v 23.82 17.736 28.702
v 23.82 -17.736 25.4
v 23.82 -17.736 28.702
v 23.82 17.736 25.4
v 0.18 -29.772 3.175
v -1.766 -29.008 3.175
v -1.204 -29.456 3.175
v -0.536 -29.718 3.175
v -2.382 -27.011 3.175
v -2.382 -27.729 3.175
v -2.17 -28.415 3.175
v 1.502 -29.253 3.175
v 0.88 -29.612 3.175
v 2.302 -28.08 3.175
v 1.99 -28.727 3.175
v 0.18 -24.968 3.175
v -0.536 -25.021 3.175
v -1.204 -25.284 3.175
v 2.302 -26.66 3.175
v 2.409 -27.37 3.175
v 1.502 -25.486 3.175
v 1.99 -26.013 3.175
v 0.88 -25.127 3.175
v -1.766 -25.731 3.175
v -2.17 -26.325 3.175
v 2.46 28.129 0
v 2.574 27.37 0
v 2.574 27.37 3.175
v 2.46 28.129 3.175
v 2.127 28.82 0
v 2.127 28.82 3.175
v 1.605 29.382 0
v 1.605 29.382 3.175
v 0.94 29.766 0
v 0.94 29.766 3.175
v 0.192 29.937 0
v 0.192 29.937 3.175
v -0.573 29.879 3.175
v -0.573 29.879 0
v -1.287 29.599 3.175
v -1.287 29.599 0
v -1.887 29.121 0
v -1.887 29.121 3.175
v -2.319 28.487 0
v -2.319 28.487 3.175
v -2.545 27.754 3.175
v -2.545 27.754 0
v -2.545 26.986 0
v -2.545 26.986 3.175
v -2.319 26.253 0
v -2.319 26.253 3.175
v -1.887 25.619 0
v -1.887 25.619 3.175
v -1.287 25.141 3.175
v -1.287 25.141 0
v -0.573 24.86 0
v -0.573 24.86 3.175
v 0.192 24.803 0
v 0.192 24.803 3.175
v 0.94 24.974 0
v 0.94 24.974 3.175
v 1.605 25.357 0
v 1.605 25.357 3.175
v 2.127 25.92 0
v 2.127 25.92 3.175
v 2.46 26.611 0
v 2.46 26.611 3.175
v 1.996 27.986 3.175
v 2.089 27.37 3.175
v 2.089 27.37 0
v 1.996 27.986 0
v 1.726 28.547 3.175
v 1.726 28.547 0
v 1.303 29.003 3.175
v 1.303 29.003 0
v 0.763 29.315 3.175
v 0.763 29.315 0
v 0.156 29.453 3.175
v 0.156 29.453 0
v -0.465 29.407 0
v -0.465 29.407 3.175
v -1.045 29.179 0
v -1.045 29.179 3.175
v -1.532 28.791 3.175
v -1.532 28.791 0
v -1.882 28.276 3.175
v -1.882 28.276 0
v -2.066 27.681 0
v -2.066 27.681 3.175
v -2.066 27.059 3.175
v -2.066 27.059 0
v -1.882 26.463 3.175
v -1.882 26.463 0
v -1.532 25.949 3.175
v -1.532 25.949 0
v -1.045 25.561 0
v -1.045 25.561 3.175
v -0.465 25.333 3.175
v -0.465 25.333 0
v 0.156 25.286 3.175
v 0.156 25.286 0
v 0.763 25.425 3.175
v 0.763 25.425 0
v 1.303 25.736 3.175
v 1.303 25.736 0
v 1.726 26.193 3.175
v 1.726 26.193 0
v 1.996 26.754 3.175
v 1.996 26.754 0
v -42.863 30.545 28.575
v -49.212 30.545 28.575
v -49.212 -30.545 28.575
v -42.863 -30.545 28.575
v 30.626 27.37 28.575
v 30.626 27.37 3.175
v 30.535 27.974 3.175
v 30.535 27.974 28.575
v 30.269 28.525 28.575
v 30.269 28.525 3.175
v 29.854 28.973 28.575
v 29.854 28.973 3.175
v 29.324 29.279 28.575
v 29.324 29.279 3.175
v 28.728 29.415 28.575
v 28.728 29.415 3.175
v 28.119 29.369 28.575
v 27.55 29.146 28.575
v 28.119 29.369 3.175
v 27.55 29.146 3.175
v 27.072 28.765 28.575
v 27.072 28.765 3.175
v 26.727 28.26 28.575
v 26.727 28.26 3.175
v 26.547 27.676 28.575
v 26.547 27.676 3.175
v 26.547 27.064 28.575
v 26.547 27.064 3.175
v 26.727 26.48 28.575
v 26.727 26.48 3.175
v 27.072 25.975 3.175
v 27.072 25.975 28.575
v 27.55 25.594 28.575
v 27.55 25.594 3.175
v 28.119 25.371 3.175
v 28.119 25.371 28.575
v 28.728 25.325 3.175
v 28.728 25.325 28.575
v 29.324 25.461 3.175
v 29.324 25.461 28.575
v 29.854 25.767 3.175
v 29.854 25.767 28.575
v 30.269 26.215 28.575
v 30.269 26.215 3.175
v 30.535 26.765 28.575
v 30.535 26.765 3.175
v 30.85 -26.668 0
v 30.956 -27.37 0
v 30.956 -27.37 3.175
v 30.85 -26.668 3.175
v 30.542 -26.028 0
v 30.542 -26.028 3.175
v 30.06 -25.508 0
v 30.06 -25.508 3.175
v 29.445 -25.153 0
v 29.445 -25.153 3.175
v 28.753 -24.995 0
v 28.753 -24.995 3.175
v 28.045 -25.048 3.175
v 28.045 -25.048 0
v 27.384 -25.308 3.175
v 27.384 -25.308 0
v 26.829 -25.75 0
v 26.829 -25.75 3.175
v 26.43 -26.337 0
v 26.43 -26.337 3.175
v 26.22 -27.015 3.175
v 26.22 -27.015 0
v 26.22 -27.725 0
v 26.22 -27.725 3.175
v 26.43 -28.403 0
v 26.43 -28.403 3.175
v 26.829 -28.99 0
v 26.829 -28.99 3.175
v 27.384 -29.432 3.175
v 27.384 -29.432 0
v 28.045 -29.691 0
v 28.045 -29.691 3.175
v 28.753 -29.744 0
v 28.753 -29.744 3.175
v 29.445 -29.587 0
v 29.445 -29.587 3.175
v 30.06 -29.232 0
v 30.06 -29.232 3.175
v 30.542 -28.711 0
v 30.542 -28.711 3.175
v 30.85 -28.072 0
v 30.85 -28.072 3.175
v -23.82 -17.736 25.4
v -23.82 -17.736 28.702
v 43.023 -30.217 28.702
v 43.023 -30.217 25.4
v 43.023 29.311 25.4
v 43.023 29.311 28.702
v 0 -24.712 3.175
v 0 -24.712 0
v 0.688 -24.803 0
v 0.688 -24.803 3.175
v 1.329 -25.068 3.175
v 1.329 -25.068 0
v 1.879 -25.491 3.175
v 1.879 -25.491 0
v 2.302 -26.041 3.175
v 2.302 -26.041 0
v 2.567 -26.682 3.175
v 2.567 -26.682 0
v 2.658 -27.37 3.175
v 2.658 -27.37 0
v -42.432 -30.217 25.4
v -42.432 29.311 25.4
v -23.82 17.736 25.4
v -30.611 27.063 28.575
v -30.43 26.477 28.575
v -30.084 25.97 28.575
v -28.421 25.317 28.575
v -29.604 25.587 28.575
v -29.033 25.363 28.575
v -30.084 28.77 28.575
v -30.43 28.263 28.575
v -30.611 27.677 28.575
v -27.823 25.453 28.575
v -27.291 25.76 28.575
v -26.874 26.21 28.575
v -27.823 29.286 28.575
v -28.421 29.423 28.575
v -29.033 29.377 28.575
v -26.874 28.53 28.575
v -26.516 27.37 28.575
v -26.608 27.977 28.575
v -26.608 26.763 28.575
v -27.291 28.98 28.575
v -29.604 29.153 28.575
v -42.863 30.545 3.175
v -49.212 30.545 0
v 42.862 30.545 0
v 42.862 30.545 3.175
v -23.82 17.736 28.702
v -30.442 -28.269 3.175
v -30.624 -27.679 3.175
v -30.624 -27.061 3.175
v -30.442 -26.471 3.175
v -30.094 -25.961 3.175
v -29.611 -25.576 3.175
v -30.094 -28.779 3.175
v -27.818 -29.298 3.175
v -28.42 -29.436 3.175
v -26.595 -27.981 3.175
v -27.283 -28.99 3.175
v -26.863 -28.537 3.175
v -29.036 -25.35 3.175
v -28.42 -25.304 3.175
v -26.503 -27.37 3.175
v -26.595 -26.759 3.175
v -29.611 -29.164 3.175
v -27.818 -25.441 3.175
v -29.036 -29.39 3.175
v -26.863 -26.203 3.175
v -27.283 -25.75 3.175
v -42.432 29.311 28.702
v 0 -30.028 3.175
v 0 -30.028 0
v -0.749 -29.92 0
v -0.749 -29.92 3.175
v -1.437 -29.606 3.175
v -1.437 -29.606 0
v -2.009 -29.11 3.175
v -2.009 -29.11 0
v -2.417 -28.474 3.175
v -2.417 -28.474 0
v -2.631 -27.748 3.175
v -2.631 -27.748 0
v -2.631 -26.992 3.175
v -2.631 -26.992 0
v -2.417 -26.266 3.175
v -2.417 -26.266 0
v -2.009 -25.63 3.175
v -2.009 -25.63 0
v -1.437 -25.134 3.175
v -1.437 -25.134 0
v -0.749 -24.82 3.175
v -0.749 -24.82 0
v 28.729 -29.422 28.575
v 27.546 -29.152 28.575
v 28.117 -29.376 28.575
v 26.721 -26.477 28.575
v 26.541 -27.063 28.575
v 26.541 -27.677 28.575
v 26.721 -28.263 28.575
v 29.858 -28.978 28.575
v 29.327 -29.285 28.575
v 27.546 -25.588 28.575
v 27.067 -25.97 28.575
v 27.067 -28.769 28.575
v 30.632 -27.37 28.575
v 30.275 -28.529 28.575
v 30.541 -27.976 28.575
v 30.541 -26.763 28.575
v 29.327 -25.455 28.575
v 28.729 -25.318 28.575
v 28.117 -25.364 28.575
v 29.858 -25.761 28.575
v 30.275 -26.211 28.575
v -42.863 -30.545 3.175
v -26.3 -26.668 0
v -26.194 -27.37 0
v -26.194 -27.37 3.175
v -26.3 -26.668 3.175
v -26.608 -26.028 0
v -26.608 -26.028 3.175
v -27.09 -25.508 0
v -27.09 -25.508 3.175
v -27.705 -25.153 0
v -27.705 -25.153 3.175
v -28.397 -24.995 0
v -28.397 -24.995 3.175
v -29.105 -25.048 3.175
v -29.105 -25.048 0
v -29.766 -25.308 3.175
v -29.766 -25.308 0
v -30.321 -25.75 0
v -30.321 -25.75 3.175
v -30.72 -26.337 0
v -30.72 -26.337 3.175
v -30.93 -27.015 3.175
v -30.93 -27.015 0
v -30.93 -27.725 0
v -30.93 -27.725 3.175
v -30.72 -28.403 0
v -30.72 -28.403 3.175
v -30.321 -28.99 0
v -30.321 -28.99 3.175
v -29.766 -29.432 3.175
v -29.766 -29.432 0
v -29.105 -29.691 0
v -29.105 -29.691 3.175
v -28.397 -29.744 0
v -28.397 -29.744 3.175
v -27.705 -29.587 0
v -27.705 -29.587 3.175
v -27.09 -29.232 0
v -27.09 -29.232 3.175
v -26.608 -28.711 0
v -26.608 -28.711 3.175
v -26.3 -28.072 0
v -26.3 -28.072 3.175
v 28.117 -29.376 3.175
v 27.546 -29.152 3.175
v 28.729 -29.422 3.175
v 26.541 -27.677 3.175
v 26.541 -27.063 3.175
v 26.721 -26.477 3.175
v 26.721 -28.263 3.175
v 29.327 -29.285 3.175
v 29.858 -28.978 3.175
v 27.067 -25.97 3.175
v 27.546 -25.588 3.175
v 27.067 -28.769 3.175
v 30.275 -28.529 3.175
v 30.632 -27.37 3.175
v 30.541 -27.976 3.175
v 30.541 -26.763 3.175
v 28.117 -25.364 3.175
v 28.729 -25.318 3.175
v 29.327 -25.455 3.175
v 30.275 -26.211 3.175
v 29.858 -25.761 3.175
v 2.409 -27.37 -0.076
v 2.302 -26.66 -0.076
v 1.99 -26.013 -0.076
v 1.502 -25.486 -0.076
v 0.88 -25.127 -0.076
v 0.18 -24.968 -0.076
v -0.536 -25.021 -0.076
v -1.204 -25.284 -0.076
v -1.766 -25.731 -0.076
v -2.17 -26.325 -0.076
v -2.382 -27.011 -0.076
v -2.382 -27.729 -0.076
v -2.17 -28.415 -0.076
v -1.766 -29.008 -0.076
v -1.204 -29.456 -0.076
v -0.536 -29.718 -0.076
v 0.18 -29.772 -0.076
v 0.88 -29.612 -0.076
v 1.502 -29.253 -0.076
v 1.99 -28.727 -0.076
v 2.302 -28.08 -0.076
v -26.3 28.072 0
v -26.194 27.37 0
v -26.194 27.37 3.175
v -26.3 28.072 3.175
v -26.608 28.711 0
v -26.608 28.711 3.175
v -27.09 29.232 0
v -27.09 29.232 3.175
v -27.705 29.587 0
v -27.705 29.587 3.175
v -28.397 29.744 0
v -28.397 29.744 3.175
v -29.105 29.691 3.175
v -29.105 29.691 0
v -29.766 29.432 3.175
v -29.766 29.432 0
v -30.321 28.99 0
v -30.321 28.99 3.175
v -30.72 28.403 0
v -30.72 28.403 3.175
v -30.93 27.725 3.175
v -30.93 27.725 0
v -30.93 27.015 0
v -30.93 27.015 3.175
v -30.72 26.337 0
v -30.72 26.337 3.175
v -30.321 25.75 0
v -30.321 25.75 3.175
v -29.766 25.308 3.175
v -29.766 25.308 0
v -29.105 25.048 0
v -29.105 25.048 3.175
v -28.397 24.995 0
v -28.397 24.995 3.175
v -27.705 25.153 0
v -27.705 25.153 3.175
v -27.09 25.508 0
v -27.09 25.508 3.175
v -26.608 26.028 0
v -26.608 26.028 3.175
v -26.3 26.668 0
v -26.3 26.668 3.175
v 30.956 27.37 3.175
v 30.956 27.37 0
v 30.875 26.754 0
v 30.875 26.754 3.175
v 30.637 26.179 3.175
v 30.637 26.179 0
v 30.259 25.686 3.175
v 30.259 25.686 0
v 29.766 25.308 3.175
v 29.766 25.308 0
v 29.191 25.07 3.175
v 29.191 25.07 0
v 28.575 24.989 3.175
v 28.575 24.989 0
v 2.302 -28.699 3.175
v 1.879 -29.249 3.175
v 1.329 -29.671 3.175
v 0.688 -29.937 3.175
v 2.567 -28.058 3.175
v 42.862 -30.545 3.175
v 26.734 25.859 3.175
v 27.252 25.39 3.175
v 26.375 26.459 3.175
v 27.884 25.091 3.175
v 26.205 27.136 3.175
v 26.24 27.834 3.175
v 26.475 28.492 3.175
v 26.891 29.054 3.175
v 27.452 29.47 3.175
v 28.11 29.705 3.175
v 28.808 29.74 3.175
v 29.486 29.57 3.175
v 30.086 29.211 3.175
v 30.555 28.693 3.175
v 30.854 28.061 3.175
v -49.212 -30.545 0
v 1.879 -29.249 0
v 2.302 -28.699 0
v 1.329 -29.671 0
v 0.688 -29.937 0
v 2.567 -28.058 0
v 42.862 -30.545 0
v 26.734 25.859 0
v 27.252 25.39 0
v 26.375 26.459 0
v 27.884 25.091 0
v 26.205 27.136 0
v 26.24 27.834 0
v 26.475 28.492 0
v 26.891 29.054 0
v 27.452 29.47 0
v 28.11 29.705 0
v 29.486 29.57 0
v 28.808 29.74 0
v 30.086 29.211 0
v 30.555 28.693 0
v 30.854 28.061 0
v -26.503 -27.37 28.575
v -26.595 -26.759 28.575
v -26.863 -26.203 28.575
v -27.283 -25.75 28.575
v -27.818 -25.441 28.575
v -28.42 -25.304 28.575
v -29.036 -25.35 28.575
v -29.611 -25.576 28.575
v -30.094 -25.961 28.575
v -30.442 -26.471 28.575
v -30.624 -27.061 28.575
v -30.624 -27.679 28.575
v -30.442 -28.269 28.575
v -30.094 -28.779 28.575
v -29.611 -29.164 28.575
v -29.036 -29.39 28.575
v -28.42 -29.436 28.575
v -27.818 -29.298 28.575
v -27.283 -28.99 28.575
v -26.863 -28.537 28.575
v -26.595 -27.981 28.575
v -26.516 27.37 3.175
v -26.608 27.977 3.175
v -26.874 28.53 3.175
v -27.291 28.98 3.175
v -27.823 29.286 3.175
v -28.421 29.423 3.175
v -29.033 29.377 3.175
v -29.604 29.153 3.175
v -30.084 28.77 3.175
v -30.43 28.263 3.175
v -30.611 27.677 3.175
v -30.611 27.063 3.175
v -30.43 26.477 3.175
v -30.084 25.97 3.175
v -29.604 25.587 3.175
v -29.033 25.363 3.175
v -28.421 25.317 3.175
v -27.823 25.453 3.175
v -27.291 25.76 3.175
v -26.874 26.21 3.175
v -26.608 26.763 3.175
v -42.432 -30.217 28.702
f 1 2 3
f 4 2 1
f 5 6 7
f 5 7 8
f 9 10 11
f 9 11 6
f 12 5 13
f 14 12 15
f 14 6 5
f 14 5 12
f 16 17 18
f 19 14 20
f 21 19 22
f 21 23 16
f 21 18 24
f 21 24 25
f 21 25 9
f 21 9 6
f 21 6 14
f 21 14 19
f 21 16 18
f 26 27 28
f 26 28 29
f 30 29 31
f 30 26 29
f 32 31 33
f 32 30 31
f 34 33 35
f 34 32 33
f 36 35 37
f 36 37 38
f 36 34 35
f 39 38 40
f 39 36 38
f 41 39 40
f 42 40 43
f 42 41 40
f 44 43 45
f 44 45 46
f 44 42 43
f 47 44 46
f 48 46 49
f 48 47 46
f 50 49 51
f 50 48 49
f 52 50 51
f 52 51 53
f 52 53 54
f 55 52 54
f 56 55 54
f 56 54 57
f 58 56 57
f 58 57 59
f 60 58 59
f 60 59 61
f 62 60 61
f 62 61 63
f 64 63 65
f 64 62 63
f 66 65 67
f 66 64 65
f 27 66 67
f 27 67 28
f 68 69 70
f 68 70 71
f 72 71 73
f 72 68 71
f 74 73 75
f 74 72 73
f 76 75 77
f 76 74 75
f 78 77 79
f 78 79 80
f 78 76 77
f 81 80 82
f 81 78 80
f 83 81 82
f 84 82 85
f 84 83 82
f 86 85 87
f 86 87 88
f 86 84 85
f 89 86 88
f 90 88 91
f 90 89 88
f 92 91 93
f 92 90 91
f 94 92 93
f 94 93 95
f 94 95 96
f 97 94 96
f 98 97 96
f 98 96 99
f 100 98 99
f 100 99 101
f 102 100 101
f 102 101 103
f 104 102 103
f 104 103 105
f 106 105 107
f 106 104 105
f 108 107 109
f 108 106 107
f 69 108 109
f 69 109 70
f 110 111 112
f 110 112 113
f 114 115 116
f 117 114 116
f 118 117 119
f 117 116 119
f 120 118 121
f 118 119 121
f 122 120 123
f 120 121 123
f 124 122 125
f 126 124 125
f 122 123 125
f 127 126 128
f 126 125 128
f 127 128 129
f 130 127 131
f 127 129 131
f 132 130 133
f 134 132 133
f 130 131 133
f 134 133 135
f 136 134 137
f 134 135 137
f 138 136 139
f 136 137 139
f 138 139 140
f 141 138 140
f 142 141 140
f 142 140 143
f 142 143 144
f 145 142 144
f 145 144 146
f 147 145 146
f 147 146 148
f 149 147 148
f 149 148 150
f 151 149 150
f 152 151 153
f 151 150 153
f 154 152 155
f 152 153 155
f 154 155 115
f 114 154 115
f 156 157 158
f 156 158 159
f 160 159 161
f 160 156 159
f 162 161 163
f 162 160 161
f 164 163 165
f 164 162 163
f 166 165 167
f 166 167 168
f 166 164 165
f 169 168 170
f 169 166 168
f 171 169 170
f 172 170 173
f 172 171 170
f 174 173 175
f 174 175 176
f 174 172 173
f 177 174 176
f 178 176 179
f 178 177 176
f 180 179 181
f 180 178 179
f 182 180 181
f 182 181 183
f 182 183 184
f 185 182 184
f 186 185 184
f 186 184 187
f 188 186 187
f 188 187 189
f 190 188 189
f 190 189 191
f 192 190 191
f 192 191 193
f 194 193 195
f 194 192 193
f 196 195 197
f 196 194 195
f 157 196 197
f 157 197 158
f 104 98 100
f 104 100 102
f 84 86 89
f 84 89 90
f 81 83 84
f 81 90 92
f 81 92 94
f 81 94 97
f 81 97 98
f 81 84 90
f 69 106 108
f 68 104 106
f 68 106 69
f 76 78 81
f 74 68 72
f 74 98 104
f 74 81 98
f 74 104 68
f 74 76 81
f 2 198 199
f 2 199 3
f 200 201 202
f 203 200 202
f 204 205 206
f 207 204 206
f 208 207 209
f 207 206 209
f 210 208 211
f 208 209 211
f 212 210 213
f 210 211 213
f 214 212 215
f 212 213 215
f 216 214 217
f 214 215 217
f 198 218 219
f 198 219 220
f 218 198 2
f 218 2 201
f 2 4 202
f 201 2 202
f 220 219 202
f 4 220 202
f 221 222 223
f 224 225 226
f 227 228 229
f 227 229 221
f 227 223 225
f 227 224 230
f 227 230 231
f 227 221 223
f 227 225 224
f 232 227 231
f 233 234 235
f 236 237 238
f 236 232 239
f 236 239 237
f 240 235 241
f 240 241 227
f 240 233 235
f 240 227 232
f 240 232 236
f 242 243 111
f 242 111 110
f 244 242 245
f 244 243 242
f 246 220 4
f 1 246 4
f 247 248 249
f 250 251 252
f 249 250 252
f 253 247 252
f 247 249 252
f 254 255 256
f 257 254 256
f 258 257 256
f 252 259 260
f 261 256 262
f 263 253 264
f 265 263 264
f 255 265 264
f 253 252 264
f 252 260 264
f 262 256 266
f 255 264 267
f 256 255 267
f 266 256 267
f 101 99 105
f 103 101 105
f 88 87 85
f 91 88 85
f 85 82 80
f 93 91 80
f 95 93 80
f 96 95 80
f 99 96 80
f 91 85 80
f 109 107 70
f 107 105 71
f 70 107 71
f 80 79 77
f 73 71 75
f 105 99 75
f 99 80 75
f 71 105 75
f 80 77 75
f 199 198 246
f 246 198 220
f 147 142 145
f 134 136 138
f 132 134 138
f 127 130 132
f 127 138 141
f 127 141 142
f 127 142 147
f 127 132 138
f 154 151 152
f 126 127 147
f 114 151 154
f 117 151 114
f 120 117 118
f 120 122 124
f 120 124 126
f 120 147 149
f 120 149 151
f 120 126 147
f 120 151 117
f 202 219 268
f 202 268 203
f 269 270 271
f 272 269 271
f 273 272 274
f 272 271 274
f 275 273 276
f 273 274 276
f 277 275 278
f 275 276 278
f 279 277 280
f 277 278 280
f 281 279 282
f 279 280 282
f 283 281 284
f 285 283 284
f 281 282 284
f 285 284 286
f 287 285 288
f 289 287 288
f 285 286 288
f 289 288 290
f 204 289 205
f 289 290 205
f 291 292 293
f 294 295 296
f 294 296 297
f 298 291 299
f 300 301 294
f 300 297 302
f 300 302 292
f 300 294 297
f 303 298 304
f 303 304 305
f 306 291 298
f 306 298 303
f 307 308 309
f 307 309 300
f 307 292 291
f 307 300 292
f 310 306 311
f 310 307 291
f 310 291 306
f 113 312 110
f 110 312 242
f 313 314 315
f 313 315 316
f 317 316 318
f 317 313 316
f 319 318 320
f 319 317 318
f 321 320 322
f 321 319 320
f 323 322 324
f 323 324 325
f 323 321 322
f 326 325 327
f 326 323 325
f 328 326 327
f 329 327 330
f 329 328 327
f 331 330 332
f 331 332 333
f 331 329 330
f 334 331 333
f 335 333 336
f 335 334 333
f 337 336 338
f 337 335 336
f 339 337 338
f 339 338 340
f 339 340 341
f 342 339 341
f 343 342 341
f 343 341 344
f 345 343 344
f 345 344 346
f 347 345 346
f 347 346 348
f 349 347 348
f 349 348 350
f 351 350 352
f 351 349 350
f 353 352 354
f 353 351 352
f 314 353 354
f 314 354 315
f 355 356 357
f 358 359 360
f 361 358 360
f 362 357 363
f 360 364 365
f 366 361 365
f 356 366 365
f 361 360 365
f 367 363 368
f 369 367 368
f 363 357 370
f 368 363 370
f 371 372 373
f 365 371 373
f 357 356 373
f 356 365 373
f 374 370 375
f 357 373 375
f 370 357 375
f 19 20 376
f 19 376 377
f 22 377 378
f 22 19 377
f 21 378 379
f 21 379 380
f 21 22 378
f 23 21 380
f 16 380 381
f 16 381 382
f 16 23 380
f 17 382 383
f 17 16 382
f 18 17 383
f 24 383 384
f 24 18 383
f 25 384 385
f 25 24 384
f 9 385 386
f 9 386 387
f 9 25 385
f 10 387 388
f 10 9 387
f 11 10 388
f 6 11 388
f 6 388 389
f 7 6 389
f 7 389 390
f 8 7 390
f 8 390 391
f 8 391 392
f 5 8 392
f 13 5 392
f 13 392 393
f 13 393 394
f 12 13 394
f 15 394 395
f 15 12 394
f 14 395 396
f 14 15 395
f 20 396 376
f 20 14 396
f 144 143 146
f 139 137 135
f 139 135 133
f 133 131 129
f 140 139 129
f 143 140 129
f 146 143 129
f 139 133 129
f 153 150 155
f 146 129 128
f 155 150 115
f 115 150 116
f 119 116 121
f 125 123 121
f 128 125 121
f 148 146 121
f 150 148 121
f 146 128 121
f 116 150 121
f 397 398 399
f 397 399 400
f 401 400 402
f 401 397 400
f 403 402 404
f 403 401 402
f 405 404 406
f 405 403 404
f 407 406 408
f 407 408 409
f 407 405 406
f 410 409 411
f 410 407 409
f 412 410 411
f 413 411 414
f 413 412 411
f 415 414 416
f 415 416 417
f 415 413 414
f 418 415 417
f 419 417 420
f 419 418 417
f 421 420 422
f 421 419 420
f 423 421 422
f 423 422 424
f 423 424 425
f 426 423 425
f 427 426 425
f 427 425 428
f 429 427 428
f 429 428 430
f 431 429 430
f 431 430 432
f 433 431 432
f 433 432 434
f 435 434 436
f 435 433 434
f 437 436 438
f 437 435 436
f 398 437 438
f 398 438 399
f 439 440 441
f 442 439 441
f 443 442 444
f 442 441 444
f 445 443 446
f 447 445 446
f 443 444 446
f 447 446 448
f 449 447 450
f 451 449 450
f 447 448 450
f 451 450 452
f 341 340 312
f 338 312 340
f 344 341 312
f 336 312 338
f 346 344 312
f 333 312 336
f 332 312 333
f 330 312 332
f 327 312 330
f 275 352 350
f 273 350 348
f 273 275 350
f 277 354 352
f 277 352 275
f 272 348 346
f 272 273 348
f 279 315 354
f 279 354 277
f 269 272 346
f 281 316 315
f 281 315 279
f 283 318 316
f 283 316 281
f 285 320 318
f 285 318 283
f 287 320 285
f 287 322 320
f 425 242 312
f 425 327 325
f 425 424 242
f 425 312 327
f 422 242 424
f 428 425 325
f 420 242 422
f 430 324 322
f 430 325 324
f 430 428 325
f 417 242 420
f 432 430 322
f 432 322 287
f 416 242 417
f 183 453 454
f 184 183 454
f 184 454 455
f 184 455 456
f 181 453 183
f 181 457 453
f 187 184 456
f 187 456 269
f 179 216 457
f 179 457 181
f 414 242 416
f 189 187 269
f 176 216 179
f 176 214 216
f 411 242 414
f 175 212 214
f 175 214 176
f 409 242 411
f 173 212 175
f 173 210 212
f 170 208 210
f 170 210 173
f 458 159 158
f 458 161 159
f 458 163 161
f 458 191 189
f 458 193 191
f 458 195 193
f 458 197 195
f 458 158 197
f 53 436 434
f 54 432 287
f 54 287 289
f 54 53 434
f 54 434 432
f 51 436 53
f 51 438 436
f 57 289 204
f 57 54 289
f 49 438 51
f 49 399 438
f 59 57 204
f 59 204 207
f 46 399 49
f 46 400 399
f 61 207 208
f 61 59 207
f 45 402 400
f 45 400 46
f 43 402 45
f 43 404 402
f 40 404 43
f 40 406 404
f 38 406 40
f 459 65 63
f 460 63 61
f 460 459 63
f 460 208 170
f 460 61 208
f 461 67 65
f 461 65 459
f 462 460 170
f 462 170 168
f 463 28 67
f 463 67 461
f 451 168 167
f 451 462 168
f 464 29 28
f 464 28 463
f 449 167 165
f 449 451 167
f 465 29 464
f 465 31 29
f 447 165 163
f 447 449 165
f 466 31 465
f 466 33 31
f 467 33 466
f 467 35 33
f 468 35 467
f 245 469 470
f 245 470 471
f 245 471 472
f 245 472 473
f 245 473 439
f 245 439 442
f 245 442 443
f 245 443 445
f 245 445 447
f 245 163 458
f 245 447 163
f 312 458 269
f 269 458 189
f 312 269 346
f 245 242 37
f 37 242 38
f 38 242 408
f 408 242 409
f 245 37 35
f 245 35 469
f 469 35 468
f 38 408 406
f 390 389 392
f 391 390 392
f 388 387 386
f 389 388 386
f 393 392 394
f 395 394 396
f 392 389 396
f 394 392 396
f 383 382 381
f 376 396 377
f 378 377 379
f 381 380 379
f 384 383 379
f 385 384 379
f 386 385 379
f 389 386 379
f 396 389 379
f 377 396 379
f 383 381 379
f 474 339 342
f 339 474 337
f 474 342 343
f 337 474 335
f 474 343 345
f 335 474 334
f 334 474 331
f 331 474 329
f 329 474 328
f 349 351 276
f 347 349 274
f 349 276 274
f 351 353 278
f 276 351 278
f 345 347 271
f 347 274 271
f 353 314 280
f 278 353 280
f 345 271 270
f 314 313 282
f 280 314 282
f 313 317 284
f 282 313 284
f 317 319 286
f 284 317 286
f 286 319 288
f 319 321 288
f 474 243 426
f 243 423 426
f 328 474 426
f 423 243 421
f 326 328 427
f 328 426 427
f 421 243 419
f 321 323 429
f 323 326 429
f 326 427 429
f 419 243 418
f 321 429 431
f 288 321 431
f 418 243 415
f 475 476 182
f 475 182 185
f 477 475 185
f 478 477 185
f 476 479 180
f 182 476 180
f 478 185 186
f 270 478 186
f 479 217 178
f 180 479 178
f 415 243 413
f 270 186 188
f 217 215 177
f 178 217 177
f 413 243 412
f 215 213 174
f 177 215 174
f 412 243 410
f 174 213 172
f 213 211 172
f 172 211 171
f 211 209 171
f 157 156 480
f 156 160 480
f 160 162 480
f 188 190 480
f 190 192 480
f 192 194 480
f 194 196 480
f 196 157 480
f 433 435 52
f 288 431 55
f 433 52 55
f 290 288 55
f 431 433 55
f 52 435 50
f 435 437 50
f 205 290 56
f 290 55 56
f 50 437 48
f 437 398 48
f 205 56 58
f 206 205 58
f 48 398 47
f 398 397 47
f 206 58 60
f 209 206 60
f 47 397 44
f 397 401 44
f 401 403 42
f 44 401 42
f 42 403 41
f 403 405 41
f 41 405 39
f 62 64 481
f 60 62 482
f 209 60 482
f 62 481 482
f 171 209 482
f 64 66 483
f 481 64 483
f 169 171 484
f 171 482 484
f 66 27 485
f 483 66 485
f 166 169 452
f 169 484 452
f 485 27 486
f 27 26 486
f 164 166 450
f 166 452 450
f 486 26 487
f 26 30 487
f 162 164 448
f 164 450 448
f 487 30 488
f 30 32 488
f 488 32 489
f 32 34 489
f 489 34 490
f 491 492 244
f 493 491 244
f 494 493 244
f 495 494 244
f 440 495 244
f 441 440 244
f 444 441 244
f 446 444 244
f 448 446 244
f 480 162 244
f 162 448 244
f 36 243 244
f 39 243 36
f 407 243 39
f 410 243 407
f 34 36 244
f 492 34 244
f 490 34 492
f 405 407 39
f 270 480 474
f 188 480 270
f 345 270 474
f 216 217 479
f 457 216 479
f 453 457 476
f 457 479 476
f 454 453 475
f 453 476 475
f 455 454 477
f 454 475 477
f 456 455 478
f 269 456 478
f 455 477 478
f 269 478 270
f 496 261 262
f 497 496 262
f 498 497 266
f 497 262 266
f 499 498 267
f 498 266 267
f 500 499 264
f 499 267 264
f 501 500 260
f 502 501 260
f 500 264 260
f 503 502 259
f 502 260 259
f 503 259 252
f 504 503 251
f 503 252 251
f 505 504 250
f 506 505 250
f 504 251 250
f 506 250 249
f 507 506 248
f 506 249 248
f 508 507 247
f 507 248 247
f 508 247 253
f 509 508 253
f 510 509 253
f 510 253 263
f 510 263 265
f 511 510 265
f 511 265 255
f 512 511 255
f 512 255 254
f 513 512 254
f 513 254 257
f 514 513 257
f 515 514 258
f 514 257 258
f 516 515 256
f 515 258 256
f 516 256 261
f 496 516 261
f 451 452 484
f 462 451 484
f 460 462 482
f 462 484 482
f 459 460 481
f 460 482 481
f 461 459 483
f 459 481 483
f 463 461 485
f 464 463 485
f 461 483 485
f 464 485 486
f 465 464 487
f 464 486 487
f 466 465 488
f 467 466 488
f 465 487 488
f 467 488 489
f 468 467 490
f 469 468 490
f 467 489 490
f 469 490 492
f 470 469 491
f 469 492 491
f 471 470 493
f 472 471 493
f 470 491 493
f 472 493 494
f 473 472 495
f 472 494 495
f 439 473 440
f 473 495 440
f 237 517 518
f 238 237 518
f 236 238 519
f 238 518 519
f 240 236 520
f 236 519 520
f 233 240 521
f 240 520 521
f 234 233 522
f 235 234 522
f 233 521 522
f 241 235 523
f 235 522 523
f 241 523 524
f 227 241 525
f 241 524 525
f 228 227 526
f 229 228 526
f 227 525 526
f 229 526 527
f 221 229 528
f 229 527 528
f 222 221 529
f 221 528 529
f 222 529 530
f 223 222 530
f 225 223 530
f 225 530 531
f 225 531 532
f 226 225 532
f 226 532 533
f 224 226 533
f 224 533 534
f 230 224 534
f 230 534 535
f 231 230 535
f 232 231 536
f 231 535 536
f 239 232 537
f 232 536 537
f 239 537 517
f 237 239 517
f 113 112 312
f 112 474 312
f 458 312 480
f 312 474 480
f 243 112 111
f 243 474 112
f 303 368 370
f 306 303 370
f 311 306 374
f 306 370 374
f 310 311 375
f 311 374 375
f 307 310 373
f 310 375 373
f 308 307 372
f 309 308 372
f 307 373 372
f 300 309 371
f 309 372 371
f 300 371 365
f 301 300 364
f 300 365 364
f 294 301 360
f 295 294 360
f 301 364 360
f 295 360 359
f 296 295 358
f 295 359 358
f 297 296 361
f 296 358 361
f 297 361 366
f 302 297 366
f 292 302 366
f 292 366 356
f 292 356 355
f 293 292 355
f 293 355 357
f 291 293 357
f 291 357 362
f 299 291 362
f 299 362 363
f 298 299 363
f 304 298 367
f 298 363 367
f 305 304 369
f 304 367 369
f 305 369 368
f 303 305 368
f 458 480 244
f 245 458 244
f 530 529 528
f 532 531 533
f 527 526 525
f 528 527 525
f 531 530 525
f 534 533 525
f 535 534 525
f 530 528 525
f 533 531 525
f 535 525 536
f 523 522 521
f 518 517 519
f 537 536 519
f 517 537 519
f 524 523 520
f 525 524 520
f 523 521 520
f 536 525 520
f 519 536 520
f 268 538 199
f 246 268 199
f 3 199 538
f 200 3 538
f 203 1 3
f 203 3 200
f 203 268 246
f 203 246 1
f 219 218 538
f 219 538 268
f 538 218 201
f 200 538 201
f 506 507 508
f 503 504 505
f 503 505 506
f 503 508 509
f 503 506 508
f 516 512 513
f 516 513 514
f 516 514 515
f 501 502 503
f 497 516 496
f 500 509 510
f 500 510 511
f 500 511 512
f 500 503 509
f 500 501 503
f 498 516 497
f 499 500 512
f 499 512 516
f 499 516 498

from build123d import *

# Parameters (mm, degrees)
F0_R      = 2.38125
F0_R_2    = 2.573949
F1_DEPTH  = 3.175
F2_R      = 2.058844
F3_DEPTH  = 25.4
F4_R      = 2.050606
F5_DEPTH  = 25.4
F6_R      = 2.071764
F7_DEPTH  = 25.4
F8_R      = 2.057464
F9_DEPTH  = 25.4
F10_R     = 2.089281
F11_DEPTH = 3.175
F12_R     = 2.408989
F13_DEPTH = 3.2512
F14_W     = 6.35
F14_H     = 61.089784
F15_DEPTH = 25.4
F17_W     = 85.455172
F17_H     = 59.528292
F17_W_2   = 47.639392
F17_H_2   = 35.47126
F18_DEPTH = 3.302


with BuildPart() as f1:
    # F0 (on Top) → F1 (new body)
    with BuildSketch(Plane.XY):
        with BuildLine():
            Line((42.8625, -30.544892), (42.8625, -24.194892))
            Line((42.8625, -24.194892), (4.207531, -24.194892))
            Line((4.207531, -24.194892), (0, -24.194892))
            Line((0, -24.194892), (0, -24.712245))
            ThreePointArc((0, -24.712245), (1.87924, -25.490652), (2.657647, -27.369892))
            ThreePointArc((2.657647, -27.369892), (1.87924, -29.249132), (0, -30.027538))
            Line((0, -30.027538), (0, -30.544892))
            Line((0, -30.544892), (4.207531, -30.544892))
            Line((4.207531, -30.544892), (42.8625, -30.544892))
        make_face()
        with Locations((28.575, -27.369892)):
            Circle(F0_R, mode=Mode.SUBTRACT)
        Polygon((4.207531, -24.194892), (42.8625, -24.194892), (42.8625, 24.194892), (28.575, 24.194892), (-42.8625, 24.194892), (-42.8625, 0), (-42.8625, -24.194892), (-4.207531, -24.194892), (0, -24.194892), align=None)
        with BuildLine():
            ThreePointArc((30.95625, 27.369892), (26.891202, 29.05369), (28.575, 24.988642))
            ThreePointArc((28.575, 24.988642), (30.258798, 25.686094), (30.95625, 27.369892))
        make_face()
        Polygon((28.575, 24.194892), (42.8625, 24.194892), (42.8625, 30.544892), (0, 30.544892), (-49.2125, 30.544892), (-49.2125, 0), (-42.8625, 0), (-42.8625, 24.194892), align=None)
        with Locations((-28.575, 27.369892)):
            Circle(F0_R, mode=Mode.SUBTRACT)
        with Locations((0, 27.369892)):
            Circle(F0_R_2, mode=Mode.SUBTRACT)
        with BuildLine():
            ThreePointArc((30.95625, 27.369892), (30.258798, 25.686094), (28.575, 24.988642))
            ThreePointArc((28.575, 24.988642), (26.891202, 29.05369), (30.95625, 27.369892))
        make_face(mode=Mode.SUBTRACT)
        with BuildLine():
            Line((0, -24.712245), (0, -24.194892))
            Line((0, -24.194892), (-4.207531, -24.194892))
            Line((-4.207531, -24.194892), (-42.8625, -24.194892))
            Line((-42.8625, -24.194892), (-42.8625, -30.544892))
            Line((-42.8625, -30.544892), (-4.207531, -30.544892))
            Line((-4.207531, -30.544892), (0, -30.544892))
            Line((0, -30.544892), (0, -30.027538))
            ThreePointArc((0, -30.027538), (-2.657647, -27.369892), (0, -24.712245))
        make_face()
        with Locations((-28.575, -27.369892)):
            Circle(F0_R, mode=Mode.SUBTRACT)
        Polygon((-42.8625, -30.544892), (-42.8625, -24.194892), (-42.8625, 0), (-49.2125, 0), (-49.2125, -30.544892), align=None)
    extrude(amount=F1_DEPTH)

    # F14 (on face) → F15 (join)
    with BuildSketch(Plane.XY.offset(3.175)):
        with Locations((-46.0375, 0)):
            Rectangle(F14_W, F14_H)
    extrude(amount=F15_DEPTH)


with BuildPart() as f3:
    # F2 (on face) → F3 (new body)
    with BuildSketch(Plane.XY.offset(3.175)):
        with Locations((-28.575, 27.369892)):
            Circle(F2_R)
    extrude(amount=F3_DEPTH)


with BuildPart() as f5:
    # F4 (on face) → F5 (new body)
    with BuildSketch(Plane.XY.offset(3.175)):
        with Locations((28.575, 27.369892)):
            Circle(F4_R)
    extrude(amount=F5_DEPTH)


with BuildPart() as f7:
    # F6 (on face) → F7 (new body)
    with BuildSketch(Plane.XY.offset(3.175)):
        with Locations((-28.575, -27.369892)):
            Circle(F6_R)
    extrude(amount=F7_DEPTH)


with BuildPart() as f9:
    # F8 (on face) → F9 (new body)
    with BuildSketch(Plane.XY.offset(3.175)):
        with Locations((28.575, -27.369892)):
            Circle(F8_R)
    extrude(amount=F9_DEPTH)


with BuildPart() as f11:
    # F10 (on face) → F11 (new body)
    with BuildSketch(Plane.XY.offset(3.175)):
        with Locations((0, 27.369892)):
            Circle(F10_R)
    extrude(amount=-F11_DEPTH)


with BuildPart() as f13:
    # F12 (on face) → F13 (new body)
    with BuildSketch(Plane.XY.offset(3.175)):
        with Locations((0, -27.369892)):
            Circle(F12_R)
    extrude(amount=-F13_DEPTH)


with BuildPart() as f18:
    # F17 (on offset) → F18 (new body)
    with BuildSketch(Plane.XY.offset(25.4)):
        with Locations((0.295501, -0.453204)):
            Rectangle(F17_W, F17_H)
        Rectangle(F17_W_2, F17_H_2, mode=Mode.SUBTRACT)
    extrude(amount=F18_DEPTH)


solid = Compound([f1.part, f3.part, f5.part, f7.part, f9.part, f11.part, f13.part, f18.part])
